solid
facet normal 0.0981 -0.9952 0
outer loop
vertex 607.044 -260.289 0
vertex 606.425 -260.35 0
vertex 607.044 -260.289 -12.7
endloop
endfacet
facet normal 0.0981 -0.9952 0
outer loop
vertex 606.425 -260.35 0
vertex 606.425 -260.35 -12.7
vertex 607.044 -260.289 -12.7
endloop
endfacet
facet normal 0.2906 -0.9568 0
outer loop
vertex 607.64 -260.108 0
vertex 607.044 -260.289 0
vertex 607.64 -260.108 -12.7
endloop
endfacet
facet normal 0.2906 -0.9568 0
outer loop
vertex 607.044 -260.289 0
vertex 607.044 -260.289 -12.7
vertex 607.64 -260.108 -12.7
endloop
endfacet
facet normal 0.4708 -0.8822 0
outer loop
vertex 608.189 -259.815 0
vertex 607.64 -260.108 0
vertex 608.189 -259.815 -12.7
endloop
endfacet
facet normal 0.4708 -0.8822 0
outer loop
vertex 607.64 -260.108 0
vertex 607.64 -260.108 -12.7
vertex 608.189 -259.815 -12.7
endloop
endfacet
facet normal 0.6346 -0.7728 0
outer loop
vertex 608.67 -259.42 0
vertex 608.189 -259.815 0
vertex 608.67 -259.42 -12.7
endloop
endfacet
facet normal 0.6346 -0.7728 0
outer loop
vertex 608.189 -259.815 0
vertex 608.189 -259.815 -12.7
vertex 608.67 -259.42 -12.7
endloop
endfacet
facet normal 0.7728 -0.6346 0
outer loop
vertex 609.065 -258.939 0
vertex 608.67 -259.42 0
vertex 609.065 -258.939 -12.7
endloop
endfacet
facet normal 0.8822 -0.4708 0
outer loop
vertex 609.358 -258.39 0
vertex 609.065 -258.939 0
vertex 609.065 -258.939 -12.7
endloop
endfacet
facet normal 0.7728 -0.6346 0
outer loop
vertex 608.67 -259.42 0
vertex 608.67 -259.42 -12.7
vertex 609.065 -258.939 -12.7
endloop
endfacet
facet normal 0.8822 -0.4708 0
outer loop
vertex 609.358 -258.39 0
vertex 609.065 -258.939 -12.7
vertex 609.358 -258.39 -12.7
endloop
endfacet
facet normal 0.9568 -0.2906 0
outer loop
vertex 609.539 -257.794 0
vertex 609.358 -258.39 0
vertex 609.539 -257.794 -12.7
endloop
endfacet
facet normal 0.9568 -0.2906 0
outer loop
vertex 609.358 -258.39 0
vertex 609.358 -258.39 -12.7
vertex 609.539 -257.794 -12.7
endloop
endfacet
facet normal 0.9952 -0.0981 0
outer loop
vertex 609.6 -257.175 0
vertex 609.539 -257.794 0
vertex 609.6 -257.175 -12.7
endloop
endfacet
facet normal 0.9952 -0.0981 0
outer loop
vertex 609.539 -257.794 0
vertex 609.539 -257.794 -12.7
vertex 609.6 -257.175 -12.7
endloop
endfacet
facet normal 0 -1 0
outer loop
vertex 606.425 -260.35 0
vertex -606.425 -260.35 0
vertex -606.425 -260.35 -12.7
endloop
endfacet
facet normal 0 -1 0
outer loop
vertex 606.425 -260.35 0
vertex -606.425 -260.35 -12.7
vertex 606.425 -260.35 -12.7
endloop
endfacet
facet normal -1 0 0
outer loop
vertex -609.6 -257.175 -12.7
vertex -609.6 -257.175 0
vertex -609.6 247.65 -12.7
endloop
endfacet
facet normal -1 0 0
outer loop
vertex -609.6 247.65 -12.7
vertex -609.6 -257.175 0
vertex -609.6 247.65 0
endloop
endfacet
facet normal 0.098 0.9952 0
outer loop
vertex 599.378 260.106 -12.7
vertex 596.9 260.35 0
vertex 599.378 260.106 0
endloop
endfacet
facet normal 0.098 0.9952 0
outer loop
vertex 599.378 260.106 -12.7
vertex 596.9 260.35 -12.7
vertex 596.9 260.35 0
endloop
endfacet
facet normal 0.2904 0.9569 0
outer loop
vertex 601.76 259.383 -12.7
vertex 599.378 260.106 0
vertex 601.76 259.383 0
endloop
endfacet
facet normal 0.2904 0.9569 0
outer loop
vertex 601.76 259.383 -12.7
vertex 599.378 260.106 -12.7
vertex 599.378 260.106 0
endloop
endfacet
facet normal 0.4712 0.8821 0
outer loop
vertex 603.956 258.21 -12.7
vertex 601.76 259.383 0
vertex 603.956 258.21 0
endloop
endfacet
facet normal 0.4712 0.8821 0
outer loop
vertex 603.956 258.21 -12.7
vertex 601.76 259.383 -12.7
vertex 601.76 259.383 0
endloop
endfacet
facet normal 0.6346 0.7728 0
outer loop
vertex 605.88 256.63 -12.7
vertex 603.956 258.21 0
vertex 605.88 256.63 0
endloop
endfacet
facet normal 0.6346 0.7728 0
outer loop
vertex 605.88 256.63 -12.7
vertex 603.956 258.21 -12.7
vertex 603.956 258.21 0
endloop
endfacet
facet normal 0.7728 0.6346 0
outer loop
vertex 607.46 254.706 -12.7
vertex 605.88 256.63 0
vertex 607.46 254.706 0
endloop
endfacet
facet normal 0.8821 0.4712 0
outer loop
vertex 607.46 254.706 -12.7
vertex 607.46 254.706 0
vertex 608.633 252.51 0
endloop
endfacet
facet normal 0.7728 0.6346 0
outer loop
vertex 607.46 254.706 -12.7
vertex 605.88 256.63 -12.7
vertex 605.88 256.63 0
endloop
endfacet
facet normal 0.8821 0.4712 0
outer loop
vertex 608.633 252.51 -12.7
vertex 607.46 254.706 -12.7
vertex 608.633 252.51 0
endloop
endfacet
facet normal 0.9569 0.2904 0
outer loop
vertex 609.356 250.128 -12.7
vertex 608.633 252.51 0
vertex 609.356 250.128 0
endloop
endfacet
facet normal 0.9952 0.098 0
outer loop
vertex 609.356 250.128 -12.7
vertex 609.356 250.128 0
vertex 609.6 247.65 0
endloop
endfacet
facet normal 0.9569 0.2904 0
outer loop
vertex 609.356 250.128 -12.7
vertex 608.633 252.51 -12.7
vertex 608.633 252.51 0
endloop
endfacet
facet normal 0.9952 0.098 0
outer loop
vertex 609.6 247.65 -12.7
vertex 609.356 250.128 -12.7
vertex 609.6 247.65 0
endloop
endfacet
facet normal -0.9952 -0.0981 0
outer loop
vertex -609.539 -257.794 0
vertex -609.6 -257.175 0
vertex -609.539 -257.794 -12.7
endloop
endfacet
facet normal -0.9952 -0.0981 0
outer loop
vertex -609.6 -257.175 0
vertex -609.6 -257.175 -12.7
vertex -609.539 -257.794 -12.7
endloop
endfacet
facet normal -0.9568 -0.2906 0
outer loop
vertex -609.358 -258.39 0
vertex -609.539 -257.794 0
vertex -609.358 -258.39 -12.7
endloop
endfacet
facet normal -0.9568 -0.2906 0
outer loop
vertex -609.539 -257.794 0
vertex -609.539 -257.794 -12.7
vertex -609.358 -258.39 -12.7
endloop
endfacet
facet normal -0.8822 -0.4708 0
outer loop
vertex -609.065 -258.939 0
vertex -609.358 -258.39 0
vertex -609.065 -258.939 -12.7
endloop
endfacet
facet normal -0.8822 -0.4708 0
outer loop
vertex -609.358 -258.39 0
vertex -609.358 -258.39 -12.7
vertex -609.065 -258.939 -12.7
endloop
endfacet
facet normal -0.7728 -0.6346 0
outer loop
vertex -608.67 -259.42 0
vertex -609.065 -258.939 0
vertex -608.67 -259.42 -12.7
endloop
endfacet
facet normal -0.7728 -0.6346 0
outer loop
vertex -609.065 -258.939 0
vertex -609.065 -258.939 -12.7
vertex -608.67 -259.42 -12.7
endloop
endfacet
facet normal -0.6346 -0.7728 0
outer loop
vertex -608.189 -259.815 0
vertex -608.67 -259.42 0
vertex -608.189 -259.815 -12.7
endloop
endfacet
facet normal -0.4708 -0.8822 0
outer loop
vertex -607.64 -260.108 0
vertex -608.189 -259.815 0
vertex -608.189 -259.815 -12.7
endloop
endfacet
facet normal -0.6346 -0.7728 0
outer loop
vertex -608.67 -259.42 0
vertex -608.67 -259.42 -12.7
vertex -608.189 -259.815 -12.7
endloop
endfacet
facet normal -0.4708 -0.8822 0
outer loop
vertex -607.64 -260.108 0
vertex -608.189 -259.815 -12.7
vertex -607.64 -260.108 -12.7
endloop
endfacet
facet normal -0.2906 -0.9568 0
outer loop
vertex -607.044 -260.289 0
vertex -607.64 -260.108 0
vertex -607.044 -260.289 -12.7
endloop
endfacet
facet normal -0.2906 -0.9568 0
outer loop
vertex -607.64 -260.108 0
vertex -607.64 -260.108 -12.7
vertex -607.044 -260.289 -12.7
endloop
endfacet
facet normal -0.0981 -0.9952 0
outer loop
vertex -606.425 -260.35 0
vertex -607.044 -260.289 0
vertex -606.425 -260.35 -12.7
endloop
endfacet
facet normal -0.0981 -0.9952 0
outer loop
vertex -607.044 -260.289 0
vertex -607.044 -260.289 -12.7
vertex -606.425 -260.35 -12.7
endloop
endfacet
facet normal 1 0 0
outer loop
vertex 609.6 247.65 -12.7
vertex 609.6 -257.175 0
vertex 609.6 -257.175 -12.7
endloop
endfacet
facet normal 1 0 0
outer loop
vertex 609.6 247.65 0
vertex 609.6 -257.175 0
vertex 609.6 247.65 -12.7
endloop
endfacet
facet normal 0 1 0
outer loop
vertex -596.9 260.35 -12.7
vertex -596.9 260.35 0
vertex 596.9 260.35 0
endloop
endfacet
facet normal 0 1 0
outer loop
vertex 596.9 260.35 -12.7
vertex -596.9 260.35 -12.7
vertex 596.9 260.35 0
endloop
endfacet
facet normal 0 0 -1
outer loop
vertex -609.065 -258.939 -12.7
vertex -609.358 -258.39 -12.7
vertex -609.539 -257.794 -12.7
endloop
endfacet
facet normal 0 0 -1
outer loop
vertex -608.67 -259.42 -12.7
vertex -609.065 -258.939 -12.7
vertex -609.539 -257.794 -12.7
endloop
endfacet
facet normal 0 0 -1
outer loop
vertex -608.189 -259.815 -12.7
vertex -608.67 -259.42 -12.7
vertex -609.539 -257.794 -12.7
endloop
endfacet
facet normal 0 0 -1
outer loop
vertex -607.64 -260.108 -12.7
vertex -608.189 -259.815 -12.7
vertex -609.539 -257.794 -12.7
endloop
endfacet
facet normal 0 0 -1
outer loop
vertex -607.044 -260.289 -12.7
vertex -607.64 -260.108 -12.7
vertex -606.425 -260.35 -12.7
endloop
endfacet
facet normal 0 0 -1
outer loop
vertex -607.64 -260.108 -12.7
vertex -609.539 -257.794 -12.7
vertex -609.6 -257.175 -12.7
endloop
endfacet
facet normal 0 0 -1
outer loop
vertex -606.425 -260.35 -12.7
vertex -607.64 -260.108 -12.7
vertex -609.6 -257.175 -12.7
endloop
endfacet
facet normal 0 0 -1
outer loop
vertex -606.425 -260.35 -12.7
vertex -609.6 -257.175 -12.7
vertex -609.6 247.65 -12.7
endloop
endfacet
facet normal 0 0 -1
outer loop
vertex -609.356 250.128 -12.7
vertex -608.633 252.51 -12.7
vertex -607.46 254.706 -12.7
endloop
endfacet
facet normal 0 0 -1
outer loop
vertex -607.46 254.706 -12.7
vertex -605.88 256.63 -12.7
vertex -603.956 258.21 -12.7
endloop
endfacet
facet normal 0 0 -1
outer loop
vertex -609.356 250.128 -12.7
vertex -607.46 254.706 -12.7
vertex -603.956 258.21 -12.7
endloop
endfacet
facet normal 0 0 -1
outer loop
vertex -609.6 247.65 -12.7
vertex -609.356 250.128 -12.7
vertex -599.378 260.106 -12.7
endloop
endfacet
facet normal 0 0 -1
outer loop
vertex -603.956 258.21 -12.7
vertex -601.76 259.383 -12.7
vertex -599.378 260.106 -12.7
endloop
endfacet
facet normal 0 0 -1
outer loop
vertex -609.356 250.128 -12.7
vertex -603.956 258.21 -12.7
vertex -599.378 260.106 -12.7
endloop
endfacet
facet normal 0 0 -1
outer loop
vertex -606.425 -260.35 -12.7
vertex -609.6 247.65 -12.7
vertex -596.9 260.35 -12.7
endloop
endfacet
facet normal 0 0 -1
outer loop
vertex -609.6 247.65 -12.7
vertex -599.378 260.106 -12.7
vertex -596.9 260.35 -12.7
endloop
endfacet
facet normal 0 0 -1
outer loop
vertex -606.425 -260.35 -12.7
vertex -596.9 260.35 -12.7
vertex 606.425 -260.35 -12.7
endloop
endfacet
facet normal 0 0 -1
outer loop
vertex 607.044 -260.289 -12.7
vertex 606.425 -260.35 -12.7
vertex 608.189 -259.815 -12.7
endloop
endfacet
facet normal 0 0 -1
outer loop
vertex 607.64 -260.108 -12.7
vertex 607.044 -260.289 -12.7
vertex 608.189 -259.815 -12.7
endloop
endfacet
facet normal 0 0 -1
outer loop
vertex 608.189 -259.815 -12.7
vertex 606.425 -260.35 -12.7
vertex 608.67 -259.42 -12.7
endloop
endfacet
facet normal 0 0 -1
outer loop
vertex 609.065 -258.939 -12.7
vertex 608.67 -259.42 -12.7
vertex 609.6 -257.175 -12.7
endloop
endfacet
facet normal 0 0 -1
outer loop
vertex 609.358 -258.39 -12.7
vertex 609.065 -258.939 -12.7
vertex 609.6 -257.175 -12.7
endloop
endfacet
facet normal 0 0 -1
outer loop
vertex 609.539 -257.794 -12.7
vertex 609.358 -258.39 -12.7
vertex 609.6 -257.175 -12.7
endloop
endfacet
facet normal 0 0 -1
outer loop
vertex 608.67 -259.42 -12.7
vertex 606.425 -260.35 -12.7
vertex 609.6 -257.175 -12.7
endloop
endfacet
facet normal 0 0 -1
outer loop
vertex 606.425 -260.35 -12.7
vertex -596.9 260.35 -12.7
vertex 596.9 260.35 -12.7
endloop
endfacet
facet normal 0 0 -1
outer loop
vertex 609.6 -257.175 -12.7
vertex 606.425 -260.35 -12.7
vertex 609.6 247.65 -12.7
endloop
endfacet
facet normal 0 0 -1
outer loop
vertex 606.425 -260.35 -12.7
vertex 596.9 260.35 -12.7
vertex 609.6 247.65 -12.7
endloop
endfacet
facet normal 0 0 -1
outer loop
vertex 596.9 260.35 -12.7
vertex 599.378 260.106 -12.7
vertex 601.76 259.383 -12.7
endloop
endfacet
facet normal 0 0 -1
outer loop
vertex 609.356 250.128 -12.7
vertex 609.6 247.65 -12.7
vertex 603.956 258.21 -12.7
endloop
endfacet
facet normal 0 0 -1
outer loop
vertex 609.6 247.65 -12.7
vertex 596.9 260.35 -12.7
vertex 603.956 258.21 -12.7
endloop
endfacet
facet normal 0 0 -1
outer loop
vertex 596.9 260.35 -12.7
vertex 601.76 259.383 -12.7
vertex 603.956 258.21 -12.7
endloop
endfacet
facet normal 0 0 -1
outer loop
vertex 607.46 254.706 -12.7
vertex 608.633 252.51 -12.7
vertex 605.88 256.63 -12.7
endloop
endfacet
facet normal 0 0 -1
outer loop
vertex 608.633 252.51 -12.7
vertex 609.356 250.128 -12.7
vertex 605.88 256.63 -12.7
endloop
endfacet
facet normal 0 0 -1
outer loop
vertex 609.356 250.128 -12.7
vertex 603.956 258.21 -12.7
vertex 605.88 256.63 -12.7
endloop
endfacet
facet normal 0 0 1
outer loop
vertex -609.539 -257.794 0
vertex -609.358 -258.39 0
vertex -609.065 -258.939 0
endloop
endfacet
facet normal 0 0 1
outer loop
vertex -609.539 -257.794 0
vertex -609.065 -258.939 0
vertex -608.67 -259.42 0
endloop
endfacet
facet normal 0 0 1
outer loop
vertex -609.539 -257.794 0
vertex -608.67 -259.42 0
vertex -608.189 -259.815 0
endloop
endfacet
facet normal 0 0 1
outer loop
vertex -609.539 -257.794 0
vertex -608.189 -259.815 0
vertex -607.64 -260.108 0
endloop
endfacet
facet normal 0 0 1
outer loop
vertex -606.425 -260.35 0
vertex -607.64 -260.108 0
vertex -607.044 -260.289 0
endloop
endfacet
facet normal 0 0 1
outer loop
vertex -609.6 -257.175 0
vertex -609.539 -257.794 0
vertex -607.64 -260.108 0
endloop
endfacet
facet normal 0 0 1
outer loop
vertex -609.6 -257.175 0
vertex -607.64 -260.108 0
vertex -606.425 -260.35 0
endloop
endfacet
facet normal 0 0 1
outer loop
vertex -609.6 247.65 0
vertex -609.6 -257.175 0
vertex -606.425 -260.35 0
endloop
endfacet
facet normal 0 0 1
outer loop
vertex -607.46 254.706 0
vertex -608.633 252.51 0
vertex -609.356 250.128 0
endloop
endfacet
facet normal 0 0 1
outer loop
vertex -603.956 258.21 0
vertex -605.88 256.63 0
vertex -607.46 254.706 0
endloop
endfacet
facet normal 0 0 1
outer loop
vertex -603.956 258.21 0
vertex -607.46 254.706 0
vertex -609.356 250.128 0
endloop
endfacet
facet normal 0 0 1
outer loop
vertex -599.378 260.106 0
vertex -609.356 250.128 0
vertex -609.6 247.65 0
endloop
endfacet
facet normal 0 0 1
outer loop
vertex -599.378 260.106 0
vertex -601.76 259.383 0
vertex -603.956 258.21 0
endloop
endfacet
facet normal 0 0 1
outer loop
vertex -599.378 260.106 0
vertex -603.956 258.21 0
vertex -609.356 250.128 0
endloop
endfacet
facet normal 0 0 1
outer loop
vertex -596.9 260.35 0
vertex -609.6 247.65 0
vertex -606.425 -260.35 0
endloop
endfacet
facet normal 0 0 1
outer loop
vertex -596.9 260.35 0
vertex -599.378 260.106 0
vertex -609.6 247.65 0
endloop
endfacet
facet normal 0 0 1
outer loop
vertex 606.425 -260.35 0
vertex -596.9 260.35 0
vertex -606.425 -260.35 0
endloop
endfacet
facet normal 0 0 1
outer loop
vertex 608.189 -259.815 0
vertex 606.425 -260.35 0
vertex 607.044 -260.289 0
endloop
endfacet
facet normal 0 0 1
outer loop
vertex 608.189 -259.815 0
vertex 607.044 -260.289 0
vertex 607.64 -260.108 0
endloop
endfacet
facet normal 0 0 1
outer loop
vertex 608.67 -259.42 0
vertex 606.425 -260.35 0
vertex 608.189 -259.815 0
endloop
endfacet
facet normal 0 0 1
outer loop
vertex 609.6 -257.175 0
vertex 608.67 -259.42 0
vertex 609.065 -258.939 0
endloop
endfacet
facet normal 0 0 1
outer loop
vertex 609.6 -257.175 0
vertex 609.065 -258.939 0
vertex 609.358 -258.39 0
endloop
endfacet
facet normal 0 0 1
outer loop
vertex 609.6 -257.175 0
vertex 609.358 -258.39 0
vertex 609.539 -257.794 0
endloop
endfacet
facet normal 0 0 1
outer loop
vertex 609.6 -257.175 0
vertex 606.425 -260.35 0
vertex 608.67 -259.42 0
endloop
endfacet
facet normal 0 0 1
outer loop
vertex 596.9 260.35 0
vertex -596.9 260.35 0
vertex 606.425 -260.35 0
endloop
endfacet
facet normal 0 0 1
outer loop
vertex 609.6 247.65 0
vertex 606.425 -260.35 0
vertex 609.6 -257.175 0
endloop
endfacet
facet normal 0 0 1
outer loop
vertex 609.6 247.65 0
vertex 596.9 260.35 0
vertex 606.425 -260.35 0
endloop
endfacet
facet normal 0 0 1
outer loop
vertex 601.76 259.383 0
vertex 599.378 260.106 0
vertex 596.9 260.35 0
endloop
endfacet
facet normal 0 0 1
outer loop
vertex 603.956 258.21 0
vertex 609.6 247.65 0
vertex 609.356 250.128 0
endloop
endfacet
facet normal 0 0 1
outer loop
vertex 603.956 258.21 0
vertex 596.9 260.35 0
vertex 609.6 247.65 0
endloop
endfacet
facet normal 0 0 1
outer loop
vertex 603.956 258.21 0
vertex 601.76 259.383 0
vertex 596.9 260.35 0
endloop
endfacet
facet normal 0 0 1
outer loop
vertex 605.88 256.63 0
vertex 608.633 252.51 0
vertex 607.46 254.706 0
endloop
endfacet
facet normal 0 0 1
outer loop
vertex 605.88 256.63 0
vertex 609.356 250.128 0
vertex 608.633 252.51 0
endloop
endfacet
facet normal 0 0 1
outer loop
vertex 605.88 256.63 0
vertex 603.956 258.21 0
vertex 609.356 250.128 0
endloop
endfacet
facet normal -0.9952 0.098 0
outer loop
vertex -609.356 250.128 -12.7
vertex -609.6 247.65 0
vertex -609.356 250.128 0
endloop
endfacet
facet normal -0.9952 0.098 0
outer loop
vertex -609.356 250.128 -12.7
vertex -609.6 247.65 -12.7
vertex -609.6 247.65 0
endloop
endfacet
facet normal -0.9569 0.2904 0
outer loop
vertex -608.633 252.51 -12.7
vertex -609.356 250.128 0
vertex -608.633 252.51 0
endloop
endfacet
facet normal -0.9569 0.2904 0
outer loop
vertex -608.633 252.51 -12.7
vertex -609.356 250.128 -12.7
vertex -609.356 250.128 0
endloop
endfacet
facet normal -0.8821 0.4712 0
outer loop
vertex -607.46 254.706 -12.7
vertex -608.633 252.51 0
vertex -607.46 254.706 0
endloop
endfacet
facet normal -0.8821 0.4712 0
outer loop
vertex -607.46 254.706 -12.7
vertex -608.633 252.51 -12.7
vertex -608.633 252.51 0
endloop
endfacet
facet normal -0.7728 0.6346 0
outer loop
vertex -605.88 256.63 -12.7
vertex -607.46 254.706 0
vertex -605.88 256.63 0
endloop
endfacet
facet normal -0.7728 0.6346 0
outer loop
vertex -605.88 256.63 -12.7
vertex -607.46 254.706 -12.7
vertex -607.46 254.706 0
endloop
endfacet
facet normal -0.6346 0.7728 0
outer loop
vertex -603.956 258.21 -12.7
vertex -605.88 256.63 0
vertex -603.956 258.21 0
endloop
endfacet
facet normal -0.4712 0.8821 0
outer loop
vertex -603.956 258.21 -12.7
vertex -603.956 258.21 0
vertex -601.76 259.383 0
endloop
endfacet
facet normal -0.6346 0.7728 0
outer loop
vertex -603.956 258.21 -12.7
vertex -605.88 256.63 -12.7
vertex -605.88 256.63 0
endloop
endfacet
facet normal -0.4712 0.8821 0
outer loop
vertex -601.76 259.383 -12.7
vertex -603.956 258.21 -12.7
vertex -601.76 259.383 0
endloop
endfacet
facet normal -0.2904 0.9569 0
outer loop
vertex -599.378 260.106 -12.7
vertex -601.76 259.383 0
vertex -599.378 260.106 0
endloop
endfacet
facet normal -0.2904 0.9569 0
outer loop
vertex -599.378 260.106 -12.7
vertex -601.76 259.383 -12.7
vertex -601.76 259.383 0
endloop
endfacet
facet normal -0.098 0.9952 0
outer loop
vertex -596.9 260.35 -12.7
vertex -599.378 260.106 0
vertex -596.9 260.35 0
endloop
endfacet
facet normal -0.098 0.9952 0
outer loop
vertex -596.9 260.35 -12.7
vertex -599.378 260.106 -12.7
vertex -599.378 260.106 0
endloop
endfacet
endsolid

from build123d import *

# Parameters (mm, degrees)
F0_W     = 1219.2
F0_H     = 520.7
F1_DEPTH = 12.7
F2_R     = 3.175
F3_R     = 12.7


with BuildPart() as f1:
    # F0 (on Top) → F1 (new body)
    with BuildSketch(Plane.XY):
        Rectangle(F0_W, F0_H)
    extrude(amount=-F1_DEPTH)

    # F2
    f2_edges = [f1.edges().sort_by_distance(p)[0] for p in [
        (609.6, -260.35, -6.35),
        (-609.6, -260.35, -6.35),
    ]]
    fillet(f2_edges, radius=F2_R)

    # F3
    f3_edges = [f1.edges().sort_by_distance(p)[0] for p in [
        (609.6, 260.35, -6.35),
        (-609.6, 260.35, -6.35),
    ]]
    fillet(f3_edges, radius=F3_R)


solid = f1.part
